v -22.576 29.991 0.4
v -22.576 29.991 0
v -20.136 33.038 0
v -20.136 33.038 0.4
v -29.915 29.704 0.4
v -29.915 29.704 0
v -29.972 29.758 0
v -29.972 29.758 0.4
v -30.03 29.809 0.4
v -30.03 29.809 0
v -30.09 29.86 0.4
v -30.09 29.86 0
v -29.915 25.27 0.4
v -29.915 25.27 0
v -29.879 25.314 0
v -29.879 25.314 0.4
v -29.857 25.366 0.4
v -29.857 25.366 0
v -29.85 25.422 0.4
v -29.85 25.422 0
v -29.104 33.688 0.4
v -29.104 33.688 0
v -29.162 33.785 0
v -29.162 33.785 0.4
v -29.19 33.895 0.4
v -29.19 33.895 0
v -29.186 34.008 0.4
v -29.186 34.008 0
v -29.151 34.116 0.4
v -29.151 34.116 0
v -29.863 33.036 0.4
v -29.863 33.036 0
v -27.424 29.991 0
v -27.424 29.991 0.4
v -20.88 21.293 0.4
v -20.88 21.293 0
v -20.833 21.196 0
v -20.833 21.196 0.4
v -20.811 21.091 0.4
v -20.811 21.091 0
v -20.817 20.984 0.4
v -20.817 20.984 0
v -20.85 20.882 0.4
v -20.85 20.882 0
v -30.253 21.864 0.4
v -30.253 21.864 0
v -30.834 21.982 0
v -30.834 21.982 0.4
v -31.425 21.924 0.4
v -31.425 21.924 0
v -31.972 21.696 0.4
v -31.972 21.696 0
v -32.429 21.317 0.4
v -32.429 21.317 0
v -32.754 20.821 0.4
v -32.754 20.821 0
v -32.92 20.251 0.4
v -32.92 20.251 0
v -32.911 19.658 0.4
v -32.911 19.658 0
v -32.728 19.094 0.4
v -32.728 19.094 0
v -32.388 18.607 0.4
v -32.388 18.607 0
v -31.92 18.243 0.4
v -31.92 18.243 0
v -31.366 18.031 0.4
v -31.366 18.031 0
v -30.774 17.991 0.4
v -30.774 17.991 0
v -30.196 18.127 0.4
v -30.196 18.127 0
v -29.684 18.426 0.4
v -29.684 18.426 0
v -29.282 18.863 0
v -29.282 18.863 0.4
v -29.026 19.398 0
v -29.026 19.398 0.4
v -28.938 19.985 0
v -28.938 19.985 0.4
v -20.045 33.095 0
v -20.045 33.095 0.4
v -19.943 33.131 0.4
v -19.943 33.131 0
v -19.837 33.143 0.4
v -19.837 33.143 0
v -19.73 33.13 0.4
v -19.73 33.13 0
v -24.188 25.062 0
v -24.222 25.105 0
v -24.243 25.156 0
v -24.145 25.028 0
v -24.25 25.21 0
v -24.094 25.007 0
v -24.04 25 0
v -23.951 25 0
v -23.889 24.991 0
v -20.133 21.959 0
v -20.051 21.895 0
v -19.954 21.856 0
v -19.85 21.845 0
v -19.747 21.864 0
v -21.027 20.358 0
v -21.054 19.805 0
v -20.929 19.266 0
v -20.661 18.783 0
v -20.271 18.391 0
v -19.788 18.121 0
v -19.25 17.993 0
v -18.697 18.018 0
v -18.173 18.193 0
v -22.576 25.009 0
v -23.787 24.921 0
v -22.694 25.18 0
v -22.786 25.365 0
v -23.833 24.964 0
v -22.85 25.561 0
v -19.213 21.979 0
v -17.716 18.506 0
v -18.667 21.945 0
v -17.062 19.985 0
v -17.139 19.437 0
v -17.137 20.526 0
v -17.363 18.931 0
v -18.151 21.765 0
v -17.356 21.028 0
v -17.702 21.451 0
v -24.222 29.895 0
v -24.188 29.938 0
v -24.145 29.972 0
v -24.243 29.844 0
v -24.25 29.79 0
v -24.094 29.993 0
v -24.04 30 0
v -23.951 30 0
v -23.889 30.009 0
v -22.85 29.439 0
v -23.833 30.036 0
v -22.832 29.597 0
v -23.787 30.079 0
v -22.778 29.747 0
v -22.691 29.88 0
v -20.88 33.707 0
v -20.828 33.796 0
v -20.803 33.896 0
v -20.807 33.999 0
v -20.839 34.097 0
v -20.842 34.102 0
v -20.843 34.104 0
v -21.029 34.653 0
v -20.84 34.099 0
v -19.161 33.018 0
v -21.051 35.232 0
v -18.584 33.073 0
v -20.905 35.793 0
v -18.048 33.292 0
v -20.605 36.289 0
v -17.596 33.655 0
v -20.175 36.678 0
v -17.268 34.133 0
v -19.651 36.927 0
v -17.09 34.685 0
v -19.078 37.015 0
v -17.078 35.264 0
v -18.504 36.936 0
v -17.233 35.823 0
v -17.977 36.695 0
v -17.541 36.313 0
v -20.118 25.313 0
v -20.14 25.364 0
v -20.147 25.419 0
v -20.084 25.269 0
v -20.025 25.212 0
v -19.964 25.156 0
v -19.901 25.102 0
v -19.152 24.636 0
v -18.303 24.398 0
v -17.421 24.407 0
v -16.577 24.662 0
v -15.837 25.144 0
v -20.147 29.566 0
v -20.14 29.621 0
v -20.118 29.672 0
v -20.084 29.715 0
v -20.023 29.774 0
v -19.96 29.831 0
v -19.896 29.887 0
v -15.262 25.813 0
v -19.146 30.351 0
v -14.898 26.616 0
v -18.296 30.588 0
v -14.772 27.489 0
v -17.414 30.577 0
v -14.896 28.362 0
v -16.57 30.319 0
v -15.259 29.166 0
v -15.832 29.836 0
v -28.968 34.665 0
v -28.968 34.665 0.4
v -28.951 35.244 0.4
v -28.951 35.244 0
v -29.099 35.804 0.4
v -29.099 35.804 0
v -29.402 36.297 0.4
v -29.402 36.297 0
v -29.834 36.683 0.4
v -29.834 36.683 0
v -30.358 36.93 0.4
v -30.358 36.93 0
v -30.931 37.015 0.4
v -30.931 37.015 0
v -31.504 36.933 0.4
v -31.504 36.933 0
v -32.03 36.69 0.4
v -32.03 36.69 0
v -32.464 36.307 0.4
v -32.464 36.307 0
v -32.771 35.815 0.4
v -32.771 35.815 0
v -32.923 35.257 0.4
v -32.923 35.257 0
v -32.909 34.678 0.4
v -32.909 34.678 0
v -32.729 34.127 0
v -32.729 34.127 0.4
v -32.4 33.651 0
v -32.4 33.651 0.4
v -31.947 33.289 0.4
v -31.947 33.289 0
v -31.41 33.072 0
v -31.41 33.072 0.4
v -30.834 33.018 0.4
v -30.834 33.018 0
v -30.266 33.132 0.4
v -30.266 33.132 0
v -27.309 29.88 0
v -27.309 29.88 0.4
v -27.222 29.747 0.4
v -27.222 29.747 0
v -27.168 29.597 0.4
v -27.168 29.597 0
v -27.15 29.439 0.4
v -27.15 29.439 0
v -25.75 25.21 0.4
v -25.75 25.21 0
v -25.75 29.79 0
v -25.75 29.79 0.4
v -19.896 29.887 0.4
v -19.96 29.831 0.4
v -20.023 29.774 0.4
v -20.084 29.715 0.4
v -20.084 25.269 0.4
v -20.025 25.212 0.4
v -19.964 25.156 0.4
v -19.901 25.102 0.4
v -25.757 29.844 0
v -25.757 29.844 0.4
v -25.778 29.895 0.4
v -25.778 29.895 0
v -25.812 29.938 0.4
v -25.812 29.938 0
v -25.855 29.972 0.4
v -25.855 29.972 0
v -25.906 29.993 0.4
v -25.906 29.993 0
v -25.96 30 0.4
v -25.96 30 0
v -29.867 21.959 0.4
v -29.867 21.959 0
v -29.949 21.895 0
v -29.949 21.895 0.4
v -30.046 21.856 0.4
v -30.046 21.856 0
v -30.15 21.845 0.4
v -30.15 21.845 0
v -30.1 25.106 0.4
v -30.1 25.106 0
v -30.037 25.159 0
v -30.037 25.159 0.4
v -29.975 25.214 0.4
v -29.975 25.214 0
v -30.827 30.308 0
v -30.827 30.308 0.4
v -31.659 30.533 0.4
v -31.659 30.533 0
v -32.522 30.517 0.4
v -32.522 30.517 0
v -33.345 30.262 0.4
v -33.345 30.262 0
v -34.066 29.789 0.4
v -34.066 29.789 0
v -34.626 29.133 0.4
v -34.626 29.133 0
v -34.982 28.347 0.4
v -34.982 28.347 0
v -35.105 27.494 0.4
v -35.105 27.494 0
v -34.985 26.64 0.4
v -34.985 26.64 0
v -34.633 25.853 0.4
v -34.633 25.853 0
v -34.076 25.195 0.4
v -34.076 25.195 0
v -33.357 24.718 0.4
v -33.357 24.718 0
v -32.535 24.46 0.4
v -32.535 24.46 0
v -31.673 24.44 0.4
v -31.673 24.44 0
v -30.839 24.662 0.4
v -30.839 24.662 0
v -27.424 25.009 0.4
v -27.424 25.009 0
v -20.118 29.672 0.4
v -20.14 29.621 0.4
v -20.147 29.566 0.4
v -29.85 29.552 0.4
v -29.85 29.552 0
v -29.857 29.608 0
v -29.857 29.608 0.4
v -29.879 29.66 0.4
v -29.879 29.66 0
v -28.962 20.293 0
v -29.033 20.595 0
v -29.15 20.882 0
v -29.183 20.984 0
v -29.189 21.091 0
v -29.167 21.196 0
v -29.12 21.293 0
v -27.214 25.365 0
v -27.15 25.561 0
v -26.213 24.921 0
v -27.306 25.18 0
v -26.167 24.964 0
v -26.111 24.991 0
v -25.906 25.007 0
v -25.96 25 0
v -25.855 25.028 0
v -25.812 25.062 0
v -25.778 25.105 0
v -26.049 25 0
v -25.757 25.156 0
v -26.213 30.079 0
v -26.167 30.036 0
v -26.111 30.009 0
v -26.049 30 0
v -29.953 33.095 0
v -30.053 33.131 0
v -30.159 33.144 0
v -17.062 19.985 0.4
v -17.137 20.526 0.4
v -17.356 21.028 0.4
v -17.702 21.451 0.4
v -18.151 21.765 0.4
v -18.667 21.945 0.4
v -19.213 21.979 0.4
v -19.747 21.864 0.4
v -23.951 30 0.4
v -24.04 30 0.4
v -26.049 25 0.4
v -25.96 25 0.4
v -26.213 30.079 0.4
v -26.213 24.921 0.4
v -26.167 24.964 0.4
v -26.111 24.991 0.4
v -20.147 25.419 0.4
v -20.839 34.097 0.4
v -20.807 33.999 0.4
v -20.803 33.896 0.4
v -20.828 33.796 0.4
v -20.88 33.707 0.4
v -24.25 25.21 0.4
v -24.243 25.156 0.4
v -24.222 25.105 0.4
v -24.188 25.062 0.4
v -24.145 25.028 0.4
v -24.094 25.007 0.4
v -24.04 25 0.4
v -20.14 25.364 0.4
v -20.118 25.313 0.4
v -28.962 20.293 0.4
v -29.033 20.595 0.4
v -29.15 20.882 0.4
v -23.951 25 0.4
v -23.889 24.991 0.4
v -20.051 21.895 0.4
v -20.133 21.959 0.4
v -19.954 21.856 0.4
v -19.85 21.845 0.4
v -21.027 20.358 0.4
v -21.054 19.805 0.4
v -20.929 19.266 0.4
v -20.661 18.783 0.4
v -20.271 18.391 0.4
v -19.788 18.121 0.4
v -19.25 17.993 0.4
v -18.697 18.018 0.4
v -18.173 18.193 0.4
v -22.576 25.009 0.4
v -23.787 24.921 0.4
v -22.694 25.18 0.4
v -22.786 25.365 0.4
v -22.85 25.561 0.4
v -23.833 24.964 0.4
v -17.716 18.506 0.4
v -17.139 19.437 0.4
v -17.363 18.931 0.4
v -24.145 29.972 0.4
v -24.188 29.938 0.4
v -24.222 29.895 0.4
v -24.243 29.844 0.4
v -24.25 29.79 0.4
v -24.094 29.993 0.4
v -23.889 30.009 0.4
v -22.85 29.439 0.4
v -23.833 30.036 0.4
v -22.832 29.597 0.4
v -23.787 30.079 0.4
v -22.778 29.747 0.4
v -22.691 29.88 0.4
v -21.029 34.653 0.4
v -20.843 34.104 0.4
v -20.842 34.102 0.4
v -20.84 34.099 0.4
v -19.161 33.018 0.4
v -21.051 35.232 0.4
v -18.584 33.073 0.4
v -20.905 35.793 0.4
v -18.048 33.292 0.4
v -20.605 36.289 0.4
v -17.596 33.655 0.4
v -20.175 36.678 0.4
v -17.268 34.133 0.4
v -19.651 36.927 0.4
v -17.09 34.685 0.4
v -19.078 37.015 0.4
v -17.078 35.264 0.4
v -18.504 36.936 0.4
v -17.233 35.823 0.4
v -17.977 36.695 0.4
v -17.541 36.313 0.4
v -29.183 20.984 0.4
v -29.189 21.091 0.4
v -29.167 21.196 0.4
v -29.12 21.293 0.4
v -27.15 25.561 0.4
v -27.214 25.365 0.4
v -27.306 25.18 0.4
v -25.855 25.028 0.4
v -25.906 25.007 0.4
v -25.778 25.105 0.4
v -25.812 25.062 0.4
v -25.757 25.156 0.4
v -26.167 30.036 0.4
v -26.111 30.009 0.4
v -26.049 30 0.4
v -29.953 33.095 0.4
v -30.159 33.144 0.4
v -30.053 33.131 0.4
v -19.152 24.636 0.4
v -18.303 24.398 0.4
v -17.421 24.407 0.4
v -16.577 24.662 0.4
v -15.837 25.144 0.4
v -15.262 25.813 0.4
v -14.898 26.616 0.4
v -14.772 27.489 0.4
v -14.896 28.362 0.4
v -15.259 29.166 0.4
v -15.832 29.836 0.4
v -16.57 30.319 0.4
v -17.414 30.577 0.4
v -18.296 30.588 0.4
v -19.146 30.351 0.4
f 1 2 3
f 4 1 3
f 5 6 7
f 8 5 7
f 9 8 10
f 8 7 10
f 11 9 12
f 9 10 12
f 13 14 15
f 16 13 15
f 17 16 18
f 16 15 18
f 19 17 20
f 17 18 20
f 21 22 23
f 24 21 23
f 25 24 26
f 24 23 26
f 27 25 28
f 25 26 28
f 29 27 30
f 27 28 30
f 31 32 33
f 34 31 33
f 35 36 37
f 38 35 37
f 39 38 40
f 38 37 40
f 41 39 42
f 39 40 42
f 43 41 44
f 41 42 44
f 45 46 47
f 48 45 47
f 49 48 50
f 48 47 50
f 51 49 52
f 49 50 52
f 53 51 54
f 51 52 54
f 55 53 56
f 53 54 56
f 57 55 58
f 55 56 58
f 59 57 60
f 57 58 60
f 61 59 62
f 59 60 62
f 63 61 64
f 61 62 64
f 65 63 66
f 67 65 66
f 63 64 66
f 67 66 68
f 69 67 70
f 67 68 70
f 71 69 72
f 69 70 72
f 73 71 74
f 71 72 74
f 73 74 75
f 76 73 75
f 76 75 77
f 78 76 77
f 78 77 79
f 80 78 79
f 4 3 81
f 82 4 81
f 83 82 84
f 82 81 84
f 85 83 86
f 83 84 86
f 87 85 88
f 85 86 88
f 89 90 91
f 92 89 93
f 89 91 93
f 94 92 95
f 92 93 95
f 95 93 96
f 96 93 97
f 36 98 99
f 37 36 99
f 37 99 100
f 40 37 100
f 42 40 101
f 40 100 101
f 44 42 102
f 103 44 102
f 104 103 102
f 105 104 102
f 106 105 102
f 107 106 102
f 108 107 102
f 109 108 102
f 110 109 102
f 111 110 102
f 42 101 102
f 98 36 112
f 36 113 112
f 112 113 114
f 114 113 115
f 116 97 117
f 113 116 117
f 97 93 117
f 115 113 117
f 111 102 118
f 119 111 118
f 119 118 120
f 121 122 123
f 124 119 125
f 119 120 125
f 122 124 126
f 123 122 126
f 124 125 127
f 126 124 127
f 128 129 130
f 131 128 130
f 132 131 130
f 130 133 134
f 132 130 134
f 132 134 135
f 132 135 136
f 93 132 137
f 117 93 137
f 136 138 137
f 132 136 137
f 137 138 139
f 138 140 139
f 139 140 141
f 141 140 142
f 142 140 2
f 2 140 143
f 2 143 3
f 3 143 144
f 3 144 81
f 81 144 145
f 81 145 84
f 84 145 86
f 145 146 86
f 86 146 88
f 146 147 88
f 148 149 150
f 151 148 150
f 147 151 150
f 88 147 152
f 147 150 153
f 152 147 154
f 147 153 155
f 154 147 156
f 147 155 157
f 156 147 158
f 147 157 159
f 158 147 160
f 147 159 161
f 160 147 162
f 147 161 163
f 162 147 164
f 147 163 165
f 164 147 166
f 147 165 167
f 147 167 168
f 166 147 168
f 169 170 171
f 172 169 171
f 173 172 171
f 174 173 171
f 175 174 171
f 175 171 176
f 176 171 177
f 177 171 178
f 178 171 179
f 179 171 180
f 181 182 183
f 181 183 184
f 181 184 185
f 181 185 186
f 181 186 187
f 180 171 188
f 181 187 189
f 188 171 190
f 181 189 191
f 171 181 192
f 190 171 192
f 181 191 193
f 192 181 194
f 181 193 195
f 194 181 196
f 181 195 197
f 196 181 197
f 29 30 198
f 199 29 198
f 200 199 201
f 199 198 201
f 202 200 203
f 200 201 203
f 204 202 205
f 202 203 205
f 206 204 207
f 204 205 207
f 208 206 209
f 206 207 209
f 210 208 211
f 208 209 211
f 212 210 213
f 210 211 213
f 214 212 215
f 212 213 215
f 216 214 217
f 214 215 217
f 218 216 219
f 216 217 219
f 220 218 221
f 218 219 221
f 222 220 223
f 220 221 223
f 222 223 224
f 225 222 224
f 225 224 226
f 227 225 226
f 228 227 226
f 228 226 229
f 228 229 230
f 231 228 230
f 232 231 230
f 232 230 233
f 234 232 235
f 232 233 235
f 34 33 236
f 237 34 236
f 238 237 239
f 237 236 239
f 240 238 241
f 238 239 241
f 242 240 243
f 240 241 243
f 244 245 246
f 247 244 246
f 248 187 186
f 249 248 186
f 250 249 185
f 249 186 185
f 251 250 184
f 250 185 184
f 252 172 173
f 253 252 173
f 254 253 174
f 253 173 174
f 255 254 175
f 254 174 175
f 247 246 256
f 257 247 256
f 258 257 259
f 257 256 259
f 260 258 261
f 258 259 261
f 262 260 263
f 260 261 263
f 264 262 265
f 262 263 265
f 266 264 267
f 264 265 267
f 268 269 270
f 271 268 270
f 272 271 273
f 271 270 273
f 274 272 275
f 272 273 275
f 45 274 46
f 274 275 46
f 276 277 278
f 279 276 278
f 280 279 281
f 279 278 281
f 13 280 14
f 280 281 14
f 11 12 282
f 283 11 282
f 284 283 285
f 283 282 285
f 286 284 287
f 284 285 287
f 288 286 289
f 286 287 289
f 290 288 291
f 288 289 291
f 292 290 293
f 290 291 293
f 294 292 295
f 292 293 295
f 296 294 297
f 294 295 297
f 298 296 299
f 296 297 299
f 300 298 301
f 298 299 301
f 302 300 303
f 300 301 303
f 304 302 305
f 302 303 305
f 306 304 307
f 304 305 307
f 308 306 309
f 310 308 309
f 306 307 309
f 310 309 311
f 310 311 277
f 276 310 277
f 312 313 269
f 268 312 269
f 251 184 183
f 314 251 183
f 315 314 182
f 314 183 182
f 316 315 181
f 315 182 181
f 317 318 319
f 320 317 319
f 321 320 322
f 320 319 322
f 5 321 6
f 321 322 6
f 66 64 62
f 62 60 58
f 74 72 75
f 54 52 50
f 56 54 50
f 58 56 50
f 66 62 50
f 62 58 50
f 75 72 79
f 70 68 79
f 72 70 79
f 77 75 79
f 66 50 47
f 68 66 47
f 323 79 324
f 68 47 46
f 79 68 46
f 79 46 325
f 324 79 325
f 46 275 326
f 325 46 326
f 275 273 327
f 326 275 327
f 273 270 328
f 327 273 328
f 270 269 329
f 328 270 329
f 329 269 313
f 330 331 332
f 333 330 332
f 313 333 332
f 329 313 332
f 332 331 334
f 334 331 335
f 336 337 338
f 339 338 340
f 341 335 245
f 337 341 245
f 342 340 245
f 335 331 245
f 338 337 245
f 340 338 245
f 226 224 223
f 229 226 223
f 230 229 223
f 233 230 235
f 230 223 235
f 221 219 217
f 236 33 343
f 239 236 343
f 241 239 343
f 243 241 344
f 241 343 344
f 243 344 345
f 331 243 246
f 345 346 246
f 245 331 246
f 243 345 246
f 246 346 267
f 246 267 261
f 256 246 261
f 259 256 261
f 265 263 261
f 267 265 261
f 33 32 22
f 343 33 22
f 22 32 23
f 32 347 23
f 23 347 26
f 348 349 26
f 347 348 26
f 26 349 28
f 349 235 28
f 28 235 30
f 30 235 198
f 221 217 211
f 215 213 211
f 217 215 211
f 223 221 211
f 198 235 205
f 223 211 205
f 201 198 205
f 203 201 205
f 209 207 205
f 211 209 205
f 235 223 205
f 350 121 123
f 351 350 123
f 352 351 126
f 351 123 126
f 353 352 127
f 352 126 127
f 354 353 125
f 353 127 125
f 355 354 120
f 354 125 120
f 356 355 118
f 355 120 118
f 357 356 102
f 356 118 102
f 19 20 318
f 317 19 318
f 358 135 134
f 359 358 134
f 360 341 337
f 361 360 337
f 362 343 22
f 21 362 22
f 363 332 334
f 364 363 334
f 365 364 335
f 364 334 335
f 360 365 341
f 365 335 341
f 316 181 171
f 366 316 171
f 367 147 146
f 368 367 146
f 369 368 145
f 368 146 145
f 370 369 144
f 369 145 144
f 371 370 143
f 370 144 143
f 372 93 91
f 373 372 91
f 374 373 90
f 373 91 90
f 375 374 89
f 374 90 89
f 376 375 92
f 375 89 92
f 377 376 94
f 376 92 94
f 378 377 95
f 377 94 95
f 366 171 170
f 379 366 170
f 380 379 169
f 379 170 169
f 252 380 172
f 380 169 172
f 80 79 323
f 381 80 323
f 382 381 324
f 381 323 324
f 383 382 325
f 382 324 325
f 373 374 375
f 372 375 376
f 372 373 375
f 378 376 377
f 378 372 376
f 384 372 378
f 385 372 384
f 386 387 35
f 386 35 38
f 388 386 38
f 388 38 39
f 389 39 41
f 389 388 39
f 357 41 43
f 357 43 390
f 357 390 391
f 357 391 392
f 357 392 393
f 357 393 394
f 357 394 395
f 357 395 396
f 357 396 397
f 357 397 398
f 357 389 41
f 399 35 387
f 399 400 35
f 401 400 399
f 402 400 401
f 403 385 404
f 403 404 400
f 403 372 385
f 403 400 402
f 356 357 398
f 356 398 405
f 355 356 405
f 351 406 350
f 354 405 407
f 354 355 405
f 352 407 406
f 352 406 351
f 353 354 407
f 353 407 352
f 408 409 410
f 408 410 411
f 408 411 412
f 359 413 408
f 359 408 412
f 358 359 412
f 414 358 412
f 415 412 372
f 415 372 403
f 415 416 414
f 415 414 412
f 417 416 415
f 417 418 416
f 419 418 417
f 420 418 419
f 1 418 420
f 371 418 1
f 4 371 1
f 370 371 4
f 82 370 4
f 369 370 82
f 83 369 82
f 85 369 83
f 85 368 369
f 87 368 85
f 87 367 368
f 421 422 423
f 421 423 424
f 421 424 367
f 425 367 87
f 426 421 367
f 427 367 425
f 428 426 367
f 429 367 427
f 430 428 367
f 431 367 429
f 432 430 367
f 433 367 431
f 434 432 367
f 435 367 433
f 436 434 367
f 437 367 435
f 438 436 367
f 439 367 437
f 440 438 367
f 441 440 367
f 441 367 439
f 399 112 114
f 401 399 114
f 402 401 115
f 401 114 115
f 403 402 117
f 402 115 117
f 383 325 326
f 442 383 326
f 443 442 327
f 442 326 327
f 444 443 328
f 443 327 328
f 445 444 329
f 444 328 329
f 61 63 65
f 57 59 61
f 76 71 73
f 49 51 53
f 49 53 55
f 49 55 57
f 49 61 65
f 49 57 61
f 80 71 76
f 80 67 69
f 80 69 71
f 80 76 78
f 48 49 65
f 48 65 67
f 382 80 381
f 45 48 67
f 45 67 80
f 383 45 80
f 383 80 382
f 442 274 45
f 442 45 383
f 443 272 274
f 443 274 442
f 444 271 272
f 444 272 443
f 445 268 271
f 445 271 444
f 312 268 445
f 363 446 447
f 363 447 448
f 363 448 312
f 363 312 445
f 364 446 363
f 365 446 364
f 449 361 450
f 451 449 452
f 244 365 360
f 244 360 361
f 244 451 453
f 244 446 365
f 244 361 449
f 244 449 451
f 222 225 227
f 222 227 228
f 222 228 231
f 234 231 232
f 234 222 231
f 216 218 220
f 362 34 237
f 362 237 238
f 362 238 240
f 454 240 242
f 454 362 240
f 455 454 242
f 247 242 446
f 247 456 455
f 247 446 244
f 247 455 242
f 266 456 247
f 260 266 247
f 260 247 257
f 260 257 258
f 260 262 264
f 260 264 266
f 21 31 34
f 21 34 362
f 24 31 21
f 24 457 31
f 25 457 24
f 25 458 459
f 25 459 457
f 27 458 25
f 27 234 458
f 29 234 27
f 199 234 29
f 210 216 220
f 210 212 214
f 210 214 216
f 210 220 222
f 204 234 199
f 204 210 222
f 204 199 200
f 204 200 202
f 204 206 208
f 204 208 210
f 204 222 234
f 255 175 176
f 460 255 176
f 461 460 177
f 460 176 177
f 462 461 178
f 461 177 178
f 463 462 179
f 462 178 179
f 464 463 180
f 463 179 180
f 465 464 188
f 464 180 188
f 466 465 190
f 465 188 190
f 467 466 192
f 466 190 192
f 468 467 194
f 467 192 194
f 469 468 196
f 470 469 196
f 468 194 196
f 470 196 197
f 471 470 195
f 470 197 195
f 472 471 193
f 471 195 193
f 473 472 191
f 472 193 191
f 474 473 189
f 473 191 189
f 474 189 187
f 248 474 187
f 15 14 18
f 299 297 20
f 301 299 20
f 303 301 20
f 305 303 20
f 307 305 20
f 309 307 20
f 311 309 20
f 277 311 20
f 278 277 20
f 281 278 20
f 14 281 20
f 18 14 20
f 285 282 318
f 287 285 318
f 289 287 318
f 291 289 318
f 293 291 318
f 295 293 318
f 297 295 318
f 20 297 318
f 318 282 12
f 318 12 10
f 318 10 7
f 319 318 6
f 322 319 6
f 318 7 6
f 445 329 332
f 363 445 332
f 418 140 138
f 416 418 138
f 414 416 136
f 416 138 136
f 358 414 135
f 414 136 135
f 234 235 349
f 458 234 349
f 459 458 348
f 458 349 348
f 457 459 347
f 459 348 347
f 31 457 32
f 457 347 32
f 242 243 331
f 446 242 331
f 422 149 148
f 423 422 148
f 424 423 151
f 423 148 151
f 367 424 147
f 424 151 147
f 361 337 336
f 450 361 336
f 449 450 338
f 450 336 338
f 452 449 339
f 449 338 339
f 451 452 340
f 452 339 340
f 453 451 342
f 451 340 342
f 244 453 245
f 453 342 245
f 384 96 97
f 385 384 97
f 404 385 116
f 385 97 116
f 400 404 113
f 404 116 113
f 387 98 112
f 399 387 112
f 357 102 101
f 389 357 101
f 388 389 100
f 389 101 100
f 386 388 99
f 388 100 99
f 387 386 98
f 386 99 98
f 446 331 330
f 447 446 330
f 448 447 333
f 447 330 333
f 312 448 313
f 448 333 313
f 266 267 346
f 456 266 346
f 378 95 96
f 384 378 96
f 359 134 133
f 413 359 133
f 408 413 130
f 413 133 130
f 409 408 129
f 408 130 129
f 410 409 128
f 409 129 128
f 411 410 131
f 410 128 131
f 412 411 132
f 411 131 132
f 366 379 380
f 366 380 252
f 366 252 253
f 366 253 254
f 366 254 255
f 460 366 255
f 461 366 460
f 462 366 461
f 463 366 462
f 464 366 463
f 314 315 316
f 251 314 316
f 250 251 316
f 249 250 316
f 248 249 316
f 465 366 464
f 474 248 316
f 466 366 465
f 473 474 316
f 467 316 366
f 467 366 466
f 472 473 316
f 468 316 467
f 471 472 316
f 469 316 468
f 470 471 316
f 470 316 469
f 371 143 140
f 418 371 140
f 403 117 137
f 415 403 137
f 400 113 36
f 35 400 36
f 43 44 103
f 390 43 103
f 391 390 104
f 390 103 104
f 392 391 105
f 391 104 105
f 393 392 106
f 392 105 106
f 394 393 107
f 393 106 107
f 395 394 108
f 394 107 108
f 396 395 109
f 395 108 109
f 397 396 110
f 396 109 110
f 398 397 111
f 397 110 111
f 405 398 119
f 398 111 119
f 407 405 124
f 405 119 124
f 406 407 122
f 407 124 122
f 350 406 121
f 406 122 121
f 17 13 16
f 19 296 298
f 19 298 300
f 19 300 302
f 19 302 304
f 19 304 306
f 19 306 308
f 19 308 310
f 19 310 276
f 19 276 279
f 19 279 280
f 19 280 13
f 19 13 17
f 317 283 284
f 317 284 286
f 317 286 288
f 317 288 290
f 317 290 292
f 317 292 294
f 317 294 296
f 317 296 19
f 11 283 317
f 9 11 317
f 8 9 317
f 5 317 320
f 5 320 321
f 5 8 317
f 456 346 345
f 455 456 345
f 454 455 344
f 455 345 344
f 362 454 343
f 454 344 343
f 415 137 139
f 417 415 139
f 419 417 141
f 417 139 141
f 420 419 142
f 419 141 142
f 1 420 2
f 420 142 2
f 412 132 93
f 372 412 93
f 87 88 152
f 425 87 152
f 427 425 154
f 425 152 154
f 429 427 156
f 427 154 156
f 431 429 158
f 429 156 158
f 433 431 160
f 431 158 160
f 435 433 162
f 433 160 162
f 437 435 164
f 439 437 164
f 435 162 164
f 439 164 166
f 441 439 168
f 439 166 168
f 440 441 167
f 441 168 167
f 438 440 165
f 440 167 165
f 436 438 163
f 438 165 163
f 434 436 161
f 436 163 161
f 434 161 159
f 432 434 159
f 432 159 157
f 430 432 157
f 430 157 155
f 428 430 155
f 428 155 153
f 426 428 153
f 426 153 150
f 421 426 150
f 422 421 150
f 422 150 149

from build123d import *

# Parameters (mm, degrees)
F1_DEPTH = 0.4


with BuildPart() as f1:
    # F0 (on Top) → F1 (new body)
    with BuildSketch(Plane.XY):
        with BuildLine():
            Line((-23.951034, 30), (-24.039625, 30))
            ThreePointArc((-24.039625, 30), (-24.188383, 29.938383), (-24.25, 29.789625))
            Line((-24.25, 29.789625), (-24.25, 28.186315))
            Line((-24.25, 28.186315), (-24.25, 28.012378))
            Line((-24.25, 28.012378), (-24.25, 27.5))
            Line((-24.25, 27.5), (-24.25, 26.987622))
            Line((-24.25, 26.987622), (-24.25, 26.813685))
            Line((-24.25, 26.813685), (-24.25, 25.210375))
            ThreePointArc((-24.25, 25.210375), (-24.188383, 25.061617), (-24.039625, 25))
            Line((-24.039625, 25), (-23.951034, 25))
            ThreePointArc((-23.951034, 25), (-23.859959, 24.979264), (-23.786837, 24.921143))
            Line((-23.786837, 24.921143), (-20.880492, 21.29264))
            ThreePointArc((-20.880492, 21.29264), (-20.811469, 21.091056), (-20.850062, 20.881508))
            ThreePointArc((-20.850062, 20.881508), (-20.392678, 21.478084), (-19.747364, 21.863667))
            ThreePointArc((-19.747364, 21.863667), (-19.953732, 21.855647), (-20.132727, 21.958664))
            Line((-20.132727, 21.958664), (-22.576152, 25.009223))
            ThreePointArc((-22.576152, 25.009223), (-22.742876, 25.27058), (-22.85, 25.56149))
            Line((-22.85, 25.56149), (-22.85, 29.43851))
            ThreePointArc((-22.85, 29.43851), (-22.777779, 29.746727), (-22.576152, 29.990777))
            Line((-22.576152, 29.990777), (-20.135555, 33.037805))
            ThreePointArc((-20.135555, 33.037805), (-19.943481, 33.130813), (-19.730074, 33.13012))
            ThreePointArc((-19.730074, 33.13012), (-19.855041, 33.179154), (-19.976437, 33.23646))
            ThreePointArc((-19.976437, 33.23646), (-20.392678, 33.521916), (-20.724202, 33.902485))
            ThreePointArc((-20.724202, 33.902485), (-20.786492, 34.001656), (-20.842872, 34.104302))
            ThreePointArc((-20.842872, 34.104302), (-20.802325, 33.900264), (-20.88042, 33.707451))
            Line((-20.88042, 33.707451), (-23.786837, 30.078857))
            ThreePointArc((-23.786837, 30.078857), (-23.859959, 30.020736), (-23.951034, 30))
        make_face()
        with BuildLine():
            Line((-29.863001, 33.036003), (-27.423848, 29.990777))
            ThreePointArc((-27.423848, 29.990777), (-27.222221, 29.746727), (-27.15, 29.43851))
            Line((-27.15, 29.43851), (-27.15, 25.56149))
            ThreePointArc((-27.15, 25.56149), (-27.257124, 25.27058), (-27.423848, 25.009223))
            Line((-27.423848, 25.009223), (-29.867273, 21.958664))
            ThreePointArc((-29.867273, 21.958664), (-30.046268, 21.855647), (-30.252636, 21.863667))
            ThreePointArc((-30.252636, 21.863667), (-29.607322, 21.478084), (-29.149938, 20.881508))
            ThreePointArc((-29.149938, 20.881508), (-29.188531, 21.091056), (-29.119508, 21.29264))
            Line((-29.119508, 21.29264), (-26.213163, 24.921143))
            ThreePointArc((-26.213163, 24.921143), (-26.140041, 24.979264), (-26.048966, 25))
            Line((-26.048966, 25), (-25.960375, 25))
            ThreePointArc((-25.960375, 25), (-25.811617, 25.061617), (-25.75, 25.210375))
            Line((-25.75, 25.210375), (-25.75, 26.987622))
            Line((-25.75, 26.987622), (-25.75, 28.012378))
            Line((-25.75, 28.012378), (-25.75, 29.789625))
            ThreePointArc((-25.75, 29.789625), (-25.811617, 29.938383), (-25.960375, 30))
            Line((-25.960375, 30), (-26.048966, 30))
            ThreePointArc((-26.048966, 30), (-26.140041, 30.020736), (-26.213163, 30.078857))
            Line((-26.213163, 30.078857), (-29.103915, 33.687892))
            ThreePointArc((-29.103915, 33.687892), (-29.189698, 33.894822), (-29.151426, 34.115534))
            ThreePointArc((-29.151426, 34.115534), (-29.517746, 33.606799), (-30.023563, 33.23646))
            ThreePointArc((-30.023563, 33.23646), (-30.142952, 33.180021), (-30.265805, 33.131585))
            ThreePointArc((-30.265805, 33.131585), (-30.053194, 33.131033), (-29.863001, 33.036003))
        make_face()
        with BuildLine():
            ThreePointArc((-29.151426, 34.115534), (-32.261302, 36.514626), (-30.265805, 33.131585))
            ThreePointArc((-30.265805, 33.131585), (-30.142952, 33.180021), (-30.023563, 33.23646))
            ThreePointArc((-30.023563, 33.23646), (-29.517746, 33.606799), (-29.151426, 34.115534))
        make_face()
        with BuildLine():
            ThreePointArc((-19.730074, 33.13012), (-17.74507, 36.520228), (-20.842872, 34.104302))
            ThreePointArc((-20.842872, 34.104302), (-20.786492, 34.001656), (-20.724202, 33.902485))
            ThreePointArc((-20.724202, 33.902485), (-20.392678, 33.521916), (-19.976437, 33.23646))
            ThreePointArc((-19.976437, 33.23646), (-19.855041, 33.179154), (-19.730074, 33.13012))
        make_face()
        with BuildLine():
            ThreePointArc((-19.900965, 25.102336), (-14.772092, 27.489052), (-19.895844, 29.886743))
            ThreePointArc((-19.895844, 29.886743), (-19.991897, 29.803022), (-20.084453, 29.71545))
            ThreePointArc((-20.084453, 29.71545), (-20.130847, 29.646829), (-20.147154, 29.565618))
            Line((-20.147154, 29.565618), (-20.147154, 25.419169))
            ThreePointArc((-20.147154, 25.419169), (-20.130847, 25.337957), (-20.084453, 25.269336))
            ThreePointArc((-20.084453, 25.269336), (-19.994369, 25.184012), (-19.900965, 25.102336))
        make_face()
        with BuildLine():
            ThreePointArc((-19.747364, 21.863667), (-20.392678, 21.478084), (-20.850062, 20.881508))
            ThreePointArc((-20.850062, 20.881508), (-19.523305, 18.038422), (-17.06245, 19.9846))
            ThreePointArc((-17.06245, 19.9846), (-17.915678, 21.623171), (-19.747364, 21.863667))
        make_face()
        with BuildLine():
            ThreePointArc((-29.149938, 20.881508), (-29.607322, 21.478084), (-30.252636, 21.863667))
            ThreePointArc((-30.252636, 21.863667), (-32.576121, 18.837828), (-28.93755, 19.9846))
            ThreePointArc((-28.93755, 19.9846), (-28.991371, 20.445456), (-29.149938, 20.881508))
        make_face()
        with BuildLine():
            ThreePointArc((-29.914627, 29.70432), (-30.000846, 29.783725), (-30.090035, 29.859779))
            ThreePointArc((-30.090035, 29.859779), (-35.104621, 27.494006), (-30.100424, 25.106337))
            ThreePointArc((-30.100424, 25.106337), (-30.00587, 25.186432), (-29.914627, 25.270279))
            ThreePointArc((-29.914627, 25.270279), (-29.86661, 25.339634), (-29.849699, 25.422276))
            Line((-29.849699, 25.422276), (-29.849699, 29.552324))
            ThreePointArc((-29.849699, 29.552324), (-29.86661, 29.634966), (-29.914627, 29.70432))
        make_face()
    extrude(amount=F1_DEPTH)


solid = f1.part
